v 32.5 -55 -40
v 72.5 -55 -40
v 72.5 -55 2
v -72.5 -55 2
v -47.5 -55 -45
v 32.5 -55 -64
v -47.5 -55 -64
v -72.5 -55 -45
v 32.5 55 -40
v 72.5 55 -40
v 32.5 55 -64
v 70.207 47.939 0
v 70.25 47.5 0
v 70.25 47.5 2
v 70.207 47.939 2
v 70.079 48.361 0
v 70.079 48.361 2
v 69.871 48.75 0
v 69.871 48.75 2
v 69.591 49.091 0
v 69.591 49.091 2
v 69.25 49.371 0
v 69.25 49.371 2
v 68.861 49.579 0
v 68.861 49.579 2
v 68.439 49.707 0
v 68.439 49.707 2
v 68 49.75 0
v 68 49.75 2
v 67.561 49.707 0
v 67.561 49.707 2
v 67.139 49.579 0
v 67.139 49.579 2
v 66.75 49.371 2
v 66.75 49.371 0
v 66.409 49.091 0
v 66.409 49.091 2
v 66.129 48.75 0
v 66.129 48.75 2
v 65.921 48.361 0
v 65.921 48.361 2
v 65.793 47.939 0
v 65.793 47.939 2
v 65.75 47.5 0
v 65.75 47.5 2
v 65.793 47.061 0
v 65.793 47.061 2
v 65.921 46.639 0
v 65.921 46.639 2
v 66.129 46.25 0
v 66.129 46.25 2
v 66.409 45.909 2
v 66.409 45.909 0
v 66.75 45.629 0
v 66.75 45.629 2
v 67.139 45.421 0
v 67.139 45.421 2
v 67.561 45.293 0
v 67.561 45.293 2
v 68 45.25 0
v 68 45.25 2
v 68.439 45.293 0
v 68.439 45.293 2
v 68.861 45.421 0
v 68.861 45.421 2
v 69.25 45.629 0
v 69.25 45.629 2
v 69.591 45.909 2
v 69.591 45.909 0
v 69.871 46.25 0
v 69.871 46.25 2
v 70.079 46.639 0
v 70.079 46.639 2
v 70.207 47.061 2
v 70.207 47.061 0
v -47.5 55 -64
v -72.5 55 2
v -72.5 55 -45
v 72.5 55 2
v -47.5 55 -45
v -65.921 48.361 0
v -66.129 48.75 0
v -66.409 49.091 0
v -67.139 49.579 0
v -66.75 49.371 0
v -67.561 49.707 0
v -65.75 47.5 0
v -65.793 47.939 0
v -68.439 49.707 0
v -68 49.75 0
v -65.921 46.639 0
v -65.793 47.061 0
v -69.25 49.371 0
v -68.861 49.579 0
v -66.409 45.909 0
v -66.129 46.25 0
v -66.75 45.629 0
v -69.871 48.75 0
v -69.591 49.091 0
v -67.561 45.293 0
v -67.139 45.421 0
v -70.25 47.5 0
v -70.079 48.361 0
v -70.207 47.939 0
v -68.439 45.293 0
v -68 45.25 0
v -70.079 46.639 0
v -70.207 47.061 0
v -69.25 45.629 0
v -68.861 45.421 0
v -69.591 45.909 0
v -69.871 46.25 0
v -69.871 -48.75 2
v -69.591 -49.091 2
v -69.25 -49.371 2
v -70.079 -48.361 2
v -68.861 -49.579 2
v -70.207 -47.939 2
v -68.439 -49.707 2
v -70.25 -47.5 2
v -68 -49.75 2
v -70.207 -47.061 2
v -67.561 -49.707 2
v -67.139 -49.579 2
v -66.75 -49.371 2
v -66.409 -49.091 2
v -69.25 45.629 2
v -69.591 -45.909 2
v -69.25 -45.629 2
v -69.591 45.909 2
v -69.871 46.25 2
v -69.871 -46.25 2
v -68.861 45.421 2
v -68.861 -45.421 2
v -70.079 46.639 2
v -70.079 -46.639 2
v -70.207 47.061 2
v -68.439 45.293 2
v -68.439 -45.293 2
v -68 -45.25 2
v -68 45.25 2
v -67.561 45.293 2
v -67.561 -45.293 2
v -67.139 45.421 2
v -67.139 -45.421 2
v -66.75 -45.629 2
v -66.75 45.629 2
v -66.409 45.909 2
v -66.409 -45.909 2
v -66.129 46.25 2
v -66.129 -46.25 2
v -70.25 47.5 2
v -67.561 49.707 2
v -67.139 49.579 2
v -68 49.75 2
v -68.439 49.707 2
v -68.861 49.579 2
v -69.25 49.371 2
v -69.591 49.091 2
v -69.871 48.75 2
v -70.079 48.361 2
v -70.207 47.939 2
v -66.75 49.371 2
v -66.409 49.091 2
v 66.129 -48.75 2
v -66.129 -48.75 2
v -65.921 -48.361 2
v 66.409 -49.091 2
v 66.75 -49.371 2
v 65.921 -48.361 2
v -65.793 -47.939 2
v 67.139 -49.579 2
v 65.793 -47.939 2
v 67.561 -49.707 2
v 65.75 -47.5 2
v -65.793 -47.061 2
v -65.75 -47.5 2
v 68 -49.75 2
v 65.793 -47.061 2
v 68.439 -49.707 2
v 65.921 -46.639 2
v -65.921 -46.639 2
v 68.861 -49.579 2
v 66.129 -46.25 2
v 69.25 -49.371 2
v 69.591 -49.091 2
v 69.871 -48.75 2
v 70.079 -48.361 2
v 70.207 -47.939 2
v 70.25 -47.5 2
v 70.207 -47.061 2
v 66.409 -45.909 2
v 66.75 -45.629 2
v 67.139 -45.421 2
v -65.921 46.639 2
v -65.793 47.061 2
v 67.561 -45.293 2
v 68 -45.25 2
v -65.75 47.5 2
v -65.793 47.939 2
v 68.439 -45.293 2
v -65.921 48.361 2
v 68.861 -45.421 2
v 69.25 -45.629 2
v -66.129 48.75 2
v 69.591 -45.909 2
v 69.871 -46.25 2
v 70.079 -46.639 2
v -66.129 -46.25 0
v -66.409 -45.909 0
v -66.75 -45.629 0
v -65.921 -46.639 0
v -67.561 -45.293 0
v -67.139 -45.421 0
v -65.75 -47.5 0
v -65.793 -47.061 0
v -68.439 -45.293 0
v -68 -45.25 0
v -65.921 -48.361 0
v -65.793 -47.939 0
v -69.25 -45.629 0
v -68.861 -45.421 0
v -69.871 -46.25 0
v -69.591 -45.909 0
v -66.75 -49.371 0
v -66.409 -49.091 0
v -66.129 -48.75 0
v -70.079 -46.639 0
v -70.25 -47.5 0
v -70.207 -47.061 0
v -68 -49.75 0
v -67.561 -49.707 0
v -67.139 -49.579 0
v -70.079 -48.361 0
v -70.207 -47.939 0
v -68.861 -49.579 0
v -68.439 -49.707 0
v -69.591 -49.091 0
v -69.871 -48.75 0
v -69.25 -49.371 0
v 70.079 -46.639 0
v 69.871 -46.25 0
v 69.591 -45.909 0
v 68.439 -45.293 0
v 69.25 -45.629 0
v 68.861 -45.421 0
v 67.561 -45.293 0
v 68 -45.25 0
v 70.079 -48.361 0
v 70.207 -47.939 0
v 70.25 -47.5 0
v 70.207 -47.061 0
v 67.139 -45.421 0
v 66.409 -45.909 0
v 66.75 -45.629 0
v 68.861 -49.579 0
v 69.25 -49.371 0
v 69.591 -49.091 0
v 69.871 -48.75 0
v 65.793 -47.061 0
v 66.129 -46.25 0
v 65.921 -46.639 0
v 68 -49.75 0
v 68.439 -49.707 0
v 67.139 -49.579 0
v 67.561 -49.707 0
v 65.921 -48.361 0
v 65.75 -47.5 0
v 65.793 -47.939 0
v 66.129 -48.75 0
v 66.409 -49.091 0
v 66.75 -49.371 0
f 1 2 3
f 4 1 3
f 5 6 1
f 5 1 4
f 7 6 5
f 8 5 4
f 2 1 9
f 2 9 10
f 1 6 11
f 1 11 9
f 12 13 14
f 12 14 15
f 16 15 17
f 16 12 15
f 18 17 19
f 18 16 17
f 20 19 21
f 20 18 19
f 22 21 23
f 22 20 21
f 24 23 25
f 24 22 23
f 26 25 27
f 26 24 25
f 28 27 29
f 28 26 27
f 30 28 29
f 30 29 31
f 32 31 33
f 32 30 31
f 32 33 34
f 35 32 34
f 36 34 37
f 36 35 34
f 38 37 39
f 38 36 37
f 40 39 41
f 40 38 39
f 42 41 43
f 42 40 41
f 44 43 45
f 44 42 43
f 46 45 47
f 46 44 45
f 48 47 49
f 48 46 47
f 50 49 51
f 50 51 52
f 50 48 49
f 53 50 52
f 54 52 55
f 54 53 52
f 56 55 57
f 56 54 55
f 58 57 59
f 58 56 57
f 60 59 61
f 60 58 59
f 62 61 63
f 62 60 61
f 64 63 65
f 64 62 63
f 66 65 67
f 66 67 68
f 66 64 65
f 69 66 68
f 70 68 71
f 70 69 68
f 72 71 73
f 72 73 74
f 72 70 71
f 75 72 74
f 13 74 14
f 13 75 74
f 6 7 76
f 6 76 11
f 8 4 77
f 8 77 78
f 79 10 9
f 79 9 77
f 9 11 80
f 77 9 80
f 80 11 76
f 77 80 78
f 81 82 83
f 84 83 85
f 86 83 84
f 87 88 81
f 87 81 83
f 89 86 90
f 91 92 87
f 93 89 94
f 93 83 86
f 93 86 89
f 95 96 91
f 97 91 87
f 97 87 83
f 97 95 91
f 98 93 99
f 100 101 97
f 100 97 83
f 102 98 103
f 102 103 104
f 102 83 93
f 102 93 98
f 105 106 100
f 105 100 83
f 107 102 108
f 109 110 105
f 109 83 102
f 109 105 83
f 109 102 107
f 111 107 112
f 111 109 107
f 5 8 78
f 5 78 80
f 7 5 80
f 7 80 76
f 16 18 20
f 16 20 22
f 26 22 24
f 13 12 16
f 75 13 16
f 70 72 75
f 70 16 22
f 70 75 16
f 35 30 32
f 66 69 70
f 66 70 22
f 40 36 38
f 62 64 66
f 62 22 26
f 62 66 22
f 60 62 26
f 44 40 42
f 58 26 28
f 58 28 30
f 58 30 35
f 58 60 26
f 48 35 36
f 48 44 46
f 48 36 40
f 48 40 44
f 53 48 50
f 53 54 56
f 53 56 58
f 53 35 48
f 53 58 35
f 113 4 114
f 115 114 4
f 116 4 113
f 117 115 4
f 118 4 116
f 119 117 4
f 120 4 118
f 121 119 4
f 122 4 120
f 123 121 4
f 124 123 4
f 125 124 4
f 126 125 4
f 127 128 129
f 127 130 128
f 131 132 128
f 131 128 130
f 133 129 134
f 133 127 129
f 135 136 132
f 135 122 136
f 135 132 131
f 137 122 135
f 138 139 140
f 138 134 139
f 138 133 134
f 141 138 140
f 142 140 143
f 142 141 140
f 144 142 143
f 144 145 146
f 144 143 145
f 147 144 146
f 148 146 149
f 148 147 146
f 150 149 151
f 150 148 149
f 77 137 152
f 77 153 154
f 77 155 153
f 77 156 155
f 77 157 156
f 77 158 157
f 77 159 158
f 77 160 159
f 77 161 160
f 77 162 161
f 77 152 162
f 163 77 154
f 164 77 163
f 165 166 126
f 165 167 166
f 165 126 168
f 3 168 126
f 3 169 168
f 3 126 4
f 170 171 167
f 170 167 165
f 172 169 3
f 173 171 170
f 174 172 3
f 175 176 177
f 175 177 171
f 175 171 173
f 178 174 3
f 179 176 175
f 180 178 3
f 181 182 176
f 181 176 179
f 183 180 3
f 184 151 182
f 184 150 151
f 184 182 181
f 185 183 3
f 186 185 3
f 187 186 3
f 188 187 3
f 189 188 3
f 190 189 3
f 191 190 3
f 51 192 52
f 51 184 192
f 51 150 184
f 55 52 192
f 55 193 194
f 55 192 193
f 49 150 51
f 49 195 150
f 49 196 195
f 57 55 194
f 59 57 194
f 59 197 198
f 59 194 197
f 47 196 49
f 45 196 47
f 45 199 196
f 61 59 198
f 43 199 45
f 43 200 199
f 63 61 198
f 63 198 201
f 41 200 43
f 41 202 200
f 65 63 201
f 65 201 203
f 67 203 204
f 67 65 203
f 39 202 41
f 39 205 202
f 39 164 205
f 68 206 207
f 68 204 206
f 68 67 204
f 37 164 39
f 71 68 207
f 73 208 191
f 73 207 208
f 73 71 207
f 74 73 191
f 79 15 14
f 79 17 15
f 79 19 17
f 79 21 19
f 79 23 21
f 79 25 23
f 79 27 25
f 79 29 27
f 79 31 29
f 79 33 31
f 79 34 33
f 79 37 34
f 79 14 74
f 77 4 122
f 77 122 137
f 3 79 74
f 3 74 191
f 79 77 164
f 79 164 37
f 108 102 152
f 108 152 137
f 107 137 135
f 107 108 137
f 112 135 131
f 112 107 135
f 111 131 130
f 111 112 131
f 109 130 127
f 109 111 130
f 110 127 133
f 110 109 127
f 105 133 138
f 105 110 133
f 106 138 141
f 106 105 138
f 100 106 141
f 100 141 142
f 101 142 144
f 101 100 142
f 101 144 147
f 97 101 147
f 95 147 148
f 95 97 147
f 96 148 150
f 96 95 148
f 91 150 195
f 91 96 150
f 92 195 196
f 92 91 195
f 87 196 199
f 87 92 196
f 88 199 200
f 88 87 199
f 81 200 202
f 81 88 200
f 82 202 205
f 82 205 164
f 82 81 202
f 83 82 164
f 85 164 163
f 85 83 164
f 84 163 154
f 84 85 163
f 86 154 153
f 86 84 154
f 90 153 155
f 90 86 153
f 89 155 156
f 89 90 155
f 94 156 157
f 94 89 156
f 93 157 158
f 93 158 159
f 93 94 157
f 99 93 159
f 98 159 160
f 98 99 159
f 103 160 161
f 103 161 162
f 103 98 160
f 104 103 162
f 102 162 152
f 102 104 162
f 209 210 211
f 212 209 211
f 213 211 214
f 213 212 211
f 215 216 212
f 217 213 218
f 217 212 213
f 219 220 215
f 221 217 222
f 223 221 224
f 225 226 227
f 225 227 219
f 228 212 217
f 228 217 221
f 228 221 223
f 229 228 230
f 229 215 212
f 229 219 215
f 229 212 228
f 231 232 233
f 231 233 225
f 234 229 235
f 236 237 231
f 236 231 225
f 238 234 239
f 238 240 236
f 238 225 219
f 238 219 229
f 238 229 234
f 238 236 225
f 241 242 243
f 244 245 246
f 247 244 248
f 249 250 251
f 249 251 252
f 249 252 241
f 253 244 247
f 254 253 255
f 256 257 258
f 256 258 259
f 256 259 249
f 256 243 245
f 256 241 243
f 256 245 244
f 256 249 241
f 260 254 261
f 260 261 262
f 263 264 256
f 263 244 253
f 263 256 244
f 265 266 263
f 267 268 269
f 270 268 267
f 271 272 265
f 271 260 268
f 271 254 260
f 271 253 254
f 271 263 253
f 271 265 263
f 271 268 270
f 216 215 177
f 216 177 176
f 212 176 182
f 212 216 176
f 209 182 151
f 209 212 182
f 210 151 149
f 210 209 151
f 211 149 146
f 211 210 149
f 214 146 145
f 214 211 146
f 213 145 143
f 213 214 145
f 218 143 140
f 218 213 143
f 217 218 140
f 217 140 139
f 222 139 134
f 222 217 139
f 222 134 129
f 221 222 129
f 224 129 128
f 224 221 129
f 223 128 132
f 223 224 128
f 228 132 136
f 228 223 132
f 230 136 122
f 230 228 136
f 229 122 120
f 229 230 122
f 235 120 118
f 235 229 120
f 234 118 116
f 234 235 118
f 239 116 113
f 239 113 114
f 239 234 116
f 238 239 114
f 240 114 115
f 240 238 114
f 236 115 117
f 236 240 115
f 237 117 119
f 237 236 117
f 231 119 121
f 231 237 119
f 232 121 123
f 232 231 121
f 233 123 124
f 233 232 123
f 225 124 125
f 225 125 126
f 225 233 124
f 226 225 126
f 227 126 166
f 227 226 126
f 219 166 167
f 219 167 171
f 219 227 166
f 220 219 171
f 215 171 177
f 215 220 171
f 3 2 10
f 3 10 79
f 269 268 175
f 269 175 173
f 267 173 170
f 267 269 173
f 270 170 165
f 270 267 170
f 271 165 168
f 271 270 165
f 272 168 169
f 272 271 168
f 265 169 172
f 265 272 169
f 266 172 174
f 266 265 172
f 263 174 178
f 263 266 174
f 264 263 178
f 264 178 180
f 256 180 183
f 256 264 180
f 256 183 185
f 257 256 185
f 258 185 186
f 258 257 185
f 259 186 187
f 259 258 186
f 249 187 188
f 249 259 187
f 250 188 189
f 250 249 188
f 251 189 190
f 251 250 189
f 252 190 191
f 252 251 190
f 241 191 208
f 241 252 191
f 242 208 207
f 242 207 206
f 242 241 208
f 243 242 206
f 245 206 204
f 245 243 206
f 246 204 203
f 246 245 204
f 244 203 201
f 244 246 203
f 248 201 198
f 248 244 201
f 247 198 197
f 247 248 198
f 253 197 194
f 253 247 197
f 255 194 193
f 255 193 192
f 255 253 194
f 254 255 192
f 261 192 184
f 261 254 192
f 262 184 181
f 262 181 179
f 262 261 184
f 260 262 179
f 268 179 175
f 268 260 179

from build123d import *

# Parameters (mm, degrees)
SKETCH1_W                = 145
SKETCH1_H                = 110
SKETCH1_R                = 2.25
BOSS_EXTRUDE1_DEPTH      = 2
BOSS_EXTRUDE2_DEPTH      = 55
BOSS_EXTRUDE2_DEPTH_BACK = 55


with BuildPart() as part:
    # Sketch1 → Boss-Extrude1 (new body)
    with BuildSketch(Plane.XY):
        Rectangle(SKETCH1_W, SKETCH1_H)
        with Locations((-68, -47.5)):
            Circle(SKETCH1_R, mode=Mode.SUBTRACT)
        with Locations(Location((68, -47.5, 0), (0, 0, 180))):
            Circle(SKETCH1_R, mode=Mode.SUBTRACT)
        with Locations((68, 47.5)):
            Circle(SKETCH1_R, mode=Mode.SUBTRACT)
        with Locations(Location((-68, 47.5, 0), (0, 0, 180))):
            Circle(SKETCH1_R, mode=Mode.SUBTRACT)
    extrude(amount=BOSS_EXTRUDE1_DEPTH)

    # Sketch3 → Boss-Extrude2 (add, two sides: drawn at the far end of the back side and taken through both)
    with BuildSketch(Plane(origin=(0, 0, 0), x_dir=(1, 0, 0), z_dir=(0, 1, 0)).offset(-BOSS_EXTRUDE2_DEPTH_BACK)):
        Polygon((-72.5, 0), (-72.5, 45), (-47.5, 45), (-47.5, 64), (32.5, 64), (32.5, 40), (72.5, 40), (72.5, 0), align=None)
    extrude(amount=BOSS_EXTRUDE2_DEPTH + BOSS_EXTRUDE2_DEPTH_BACK)


solid = part.part
